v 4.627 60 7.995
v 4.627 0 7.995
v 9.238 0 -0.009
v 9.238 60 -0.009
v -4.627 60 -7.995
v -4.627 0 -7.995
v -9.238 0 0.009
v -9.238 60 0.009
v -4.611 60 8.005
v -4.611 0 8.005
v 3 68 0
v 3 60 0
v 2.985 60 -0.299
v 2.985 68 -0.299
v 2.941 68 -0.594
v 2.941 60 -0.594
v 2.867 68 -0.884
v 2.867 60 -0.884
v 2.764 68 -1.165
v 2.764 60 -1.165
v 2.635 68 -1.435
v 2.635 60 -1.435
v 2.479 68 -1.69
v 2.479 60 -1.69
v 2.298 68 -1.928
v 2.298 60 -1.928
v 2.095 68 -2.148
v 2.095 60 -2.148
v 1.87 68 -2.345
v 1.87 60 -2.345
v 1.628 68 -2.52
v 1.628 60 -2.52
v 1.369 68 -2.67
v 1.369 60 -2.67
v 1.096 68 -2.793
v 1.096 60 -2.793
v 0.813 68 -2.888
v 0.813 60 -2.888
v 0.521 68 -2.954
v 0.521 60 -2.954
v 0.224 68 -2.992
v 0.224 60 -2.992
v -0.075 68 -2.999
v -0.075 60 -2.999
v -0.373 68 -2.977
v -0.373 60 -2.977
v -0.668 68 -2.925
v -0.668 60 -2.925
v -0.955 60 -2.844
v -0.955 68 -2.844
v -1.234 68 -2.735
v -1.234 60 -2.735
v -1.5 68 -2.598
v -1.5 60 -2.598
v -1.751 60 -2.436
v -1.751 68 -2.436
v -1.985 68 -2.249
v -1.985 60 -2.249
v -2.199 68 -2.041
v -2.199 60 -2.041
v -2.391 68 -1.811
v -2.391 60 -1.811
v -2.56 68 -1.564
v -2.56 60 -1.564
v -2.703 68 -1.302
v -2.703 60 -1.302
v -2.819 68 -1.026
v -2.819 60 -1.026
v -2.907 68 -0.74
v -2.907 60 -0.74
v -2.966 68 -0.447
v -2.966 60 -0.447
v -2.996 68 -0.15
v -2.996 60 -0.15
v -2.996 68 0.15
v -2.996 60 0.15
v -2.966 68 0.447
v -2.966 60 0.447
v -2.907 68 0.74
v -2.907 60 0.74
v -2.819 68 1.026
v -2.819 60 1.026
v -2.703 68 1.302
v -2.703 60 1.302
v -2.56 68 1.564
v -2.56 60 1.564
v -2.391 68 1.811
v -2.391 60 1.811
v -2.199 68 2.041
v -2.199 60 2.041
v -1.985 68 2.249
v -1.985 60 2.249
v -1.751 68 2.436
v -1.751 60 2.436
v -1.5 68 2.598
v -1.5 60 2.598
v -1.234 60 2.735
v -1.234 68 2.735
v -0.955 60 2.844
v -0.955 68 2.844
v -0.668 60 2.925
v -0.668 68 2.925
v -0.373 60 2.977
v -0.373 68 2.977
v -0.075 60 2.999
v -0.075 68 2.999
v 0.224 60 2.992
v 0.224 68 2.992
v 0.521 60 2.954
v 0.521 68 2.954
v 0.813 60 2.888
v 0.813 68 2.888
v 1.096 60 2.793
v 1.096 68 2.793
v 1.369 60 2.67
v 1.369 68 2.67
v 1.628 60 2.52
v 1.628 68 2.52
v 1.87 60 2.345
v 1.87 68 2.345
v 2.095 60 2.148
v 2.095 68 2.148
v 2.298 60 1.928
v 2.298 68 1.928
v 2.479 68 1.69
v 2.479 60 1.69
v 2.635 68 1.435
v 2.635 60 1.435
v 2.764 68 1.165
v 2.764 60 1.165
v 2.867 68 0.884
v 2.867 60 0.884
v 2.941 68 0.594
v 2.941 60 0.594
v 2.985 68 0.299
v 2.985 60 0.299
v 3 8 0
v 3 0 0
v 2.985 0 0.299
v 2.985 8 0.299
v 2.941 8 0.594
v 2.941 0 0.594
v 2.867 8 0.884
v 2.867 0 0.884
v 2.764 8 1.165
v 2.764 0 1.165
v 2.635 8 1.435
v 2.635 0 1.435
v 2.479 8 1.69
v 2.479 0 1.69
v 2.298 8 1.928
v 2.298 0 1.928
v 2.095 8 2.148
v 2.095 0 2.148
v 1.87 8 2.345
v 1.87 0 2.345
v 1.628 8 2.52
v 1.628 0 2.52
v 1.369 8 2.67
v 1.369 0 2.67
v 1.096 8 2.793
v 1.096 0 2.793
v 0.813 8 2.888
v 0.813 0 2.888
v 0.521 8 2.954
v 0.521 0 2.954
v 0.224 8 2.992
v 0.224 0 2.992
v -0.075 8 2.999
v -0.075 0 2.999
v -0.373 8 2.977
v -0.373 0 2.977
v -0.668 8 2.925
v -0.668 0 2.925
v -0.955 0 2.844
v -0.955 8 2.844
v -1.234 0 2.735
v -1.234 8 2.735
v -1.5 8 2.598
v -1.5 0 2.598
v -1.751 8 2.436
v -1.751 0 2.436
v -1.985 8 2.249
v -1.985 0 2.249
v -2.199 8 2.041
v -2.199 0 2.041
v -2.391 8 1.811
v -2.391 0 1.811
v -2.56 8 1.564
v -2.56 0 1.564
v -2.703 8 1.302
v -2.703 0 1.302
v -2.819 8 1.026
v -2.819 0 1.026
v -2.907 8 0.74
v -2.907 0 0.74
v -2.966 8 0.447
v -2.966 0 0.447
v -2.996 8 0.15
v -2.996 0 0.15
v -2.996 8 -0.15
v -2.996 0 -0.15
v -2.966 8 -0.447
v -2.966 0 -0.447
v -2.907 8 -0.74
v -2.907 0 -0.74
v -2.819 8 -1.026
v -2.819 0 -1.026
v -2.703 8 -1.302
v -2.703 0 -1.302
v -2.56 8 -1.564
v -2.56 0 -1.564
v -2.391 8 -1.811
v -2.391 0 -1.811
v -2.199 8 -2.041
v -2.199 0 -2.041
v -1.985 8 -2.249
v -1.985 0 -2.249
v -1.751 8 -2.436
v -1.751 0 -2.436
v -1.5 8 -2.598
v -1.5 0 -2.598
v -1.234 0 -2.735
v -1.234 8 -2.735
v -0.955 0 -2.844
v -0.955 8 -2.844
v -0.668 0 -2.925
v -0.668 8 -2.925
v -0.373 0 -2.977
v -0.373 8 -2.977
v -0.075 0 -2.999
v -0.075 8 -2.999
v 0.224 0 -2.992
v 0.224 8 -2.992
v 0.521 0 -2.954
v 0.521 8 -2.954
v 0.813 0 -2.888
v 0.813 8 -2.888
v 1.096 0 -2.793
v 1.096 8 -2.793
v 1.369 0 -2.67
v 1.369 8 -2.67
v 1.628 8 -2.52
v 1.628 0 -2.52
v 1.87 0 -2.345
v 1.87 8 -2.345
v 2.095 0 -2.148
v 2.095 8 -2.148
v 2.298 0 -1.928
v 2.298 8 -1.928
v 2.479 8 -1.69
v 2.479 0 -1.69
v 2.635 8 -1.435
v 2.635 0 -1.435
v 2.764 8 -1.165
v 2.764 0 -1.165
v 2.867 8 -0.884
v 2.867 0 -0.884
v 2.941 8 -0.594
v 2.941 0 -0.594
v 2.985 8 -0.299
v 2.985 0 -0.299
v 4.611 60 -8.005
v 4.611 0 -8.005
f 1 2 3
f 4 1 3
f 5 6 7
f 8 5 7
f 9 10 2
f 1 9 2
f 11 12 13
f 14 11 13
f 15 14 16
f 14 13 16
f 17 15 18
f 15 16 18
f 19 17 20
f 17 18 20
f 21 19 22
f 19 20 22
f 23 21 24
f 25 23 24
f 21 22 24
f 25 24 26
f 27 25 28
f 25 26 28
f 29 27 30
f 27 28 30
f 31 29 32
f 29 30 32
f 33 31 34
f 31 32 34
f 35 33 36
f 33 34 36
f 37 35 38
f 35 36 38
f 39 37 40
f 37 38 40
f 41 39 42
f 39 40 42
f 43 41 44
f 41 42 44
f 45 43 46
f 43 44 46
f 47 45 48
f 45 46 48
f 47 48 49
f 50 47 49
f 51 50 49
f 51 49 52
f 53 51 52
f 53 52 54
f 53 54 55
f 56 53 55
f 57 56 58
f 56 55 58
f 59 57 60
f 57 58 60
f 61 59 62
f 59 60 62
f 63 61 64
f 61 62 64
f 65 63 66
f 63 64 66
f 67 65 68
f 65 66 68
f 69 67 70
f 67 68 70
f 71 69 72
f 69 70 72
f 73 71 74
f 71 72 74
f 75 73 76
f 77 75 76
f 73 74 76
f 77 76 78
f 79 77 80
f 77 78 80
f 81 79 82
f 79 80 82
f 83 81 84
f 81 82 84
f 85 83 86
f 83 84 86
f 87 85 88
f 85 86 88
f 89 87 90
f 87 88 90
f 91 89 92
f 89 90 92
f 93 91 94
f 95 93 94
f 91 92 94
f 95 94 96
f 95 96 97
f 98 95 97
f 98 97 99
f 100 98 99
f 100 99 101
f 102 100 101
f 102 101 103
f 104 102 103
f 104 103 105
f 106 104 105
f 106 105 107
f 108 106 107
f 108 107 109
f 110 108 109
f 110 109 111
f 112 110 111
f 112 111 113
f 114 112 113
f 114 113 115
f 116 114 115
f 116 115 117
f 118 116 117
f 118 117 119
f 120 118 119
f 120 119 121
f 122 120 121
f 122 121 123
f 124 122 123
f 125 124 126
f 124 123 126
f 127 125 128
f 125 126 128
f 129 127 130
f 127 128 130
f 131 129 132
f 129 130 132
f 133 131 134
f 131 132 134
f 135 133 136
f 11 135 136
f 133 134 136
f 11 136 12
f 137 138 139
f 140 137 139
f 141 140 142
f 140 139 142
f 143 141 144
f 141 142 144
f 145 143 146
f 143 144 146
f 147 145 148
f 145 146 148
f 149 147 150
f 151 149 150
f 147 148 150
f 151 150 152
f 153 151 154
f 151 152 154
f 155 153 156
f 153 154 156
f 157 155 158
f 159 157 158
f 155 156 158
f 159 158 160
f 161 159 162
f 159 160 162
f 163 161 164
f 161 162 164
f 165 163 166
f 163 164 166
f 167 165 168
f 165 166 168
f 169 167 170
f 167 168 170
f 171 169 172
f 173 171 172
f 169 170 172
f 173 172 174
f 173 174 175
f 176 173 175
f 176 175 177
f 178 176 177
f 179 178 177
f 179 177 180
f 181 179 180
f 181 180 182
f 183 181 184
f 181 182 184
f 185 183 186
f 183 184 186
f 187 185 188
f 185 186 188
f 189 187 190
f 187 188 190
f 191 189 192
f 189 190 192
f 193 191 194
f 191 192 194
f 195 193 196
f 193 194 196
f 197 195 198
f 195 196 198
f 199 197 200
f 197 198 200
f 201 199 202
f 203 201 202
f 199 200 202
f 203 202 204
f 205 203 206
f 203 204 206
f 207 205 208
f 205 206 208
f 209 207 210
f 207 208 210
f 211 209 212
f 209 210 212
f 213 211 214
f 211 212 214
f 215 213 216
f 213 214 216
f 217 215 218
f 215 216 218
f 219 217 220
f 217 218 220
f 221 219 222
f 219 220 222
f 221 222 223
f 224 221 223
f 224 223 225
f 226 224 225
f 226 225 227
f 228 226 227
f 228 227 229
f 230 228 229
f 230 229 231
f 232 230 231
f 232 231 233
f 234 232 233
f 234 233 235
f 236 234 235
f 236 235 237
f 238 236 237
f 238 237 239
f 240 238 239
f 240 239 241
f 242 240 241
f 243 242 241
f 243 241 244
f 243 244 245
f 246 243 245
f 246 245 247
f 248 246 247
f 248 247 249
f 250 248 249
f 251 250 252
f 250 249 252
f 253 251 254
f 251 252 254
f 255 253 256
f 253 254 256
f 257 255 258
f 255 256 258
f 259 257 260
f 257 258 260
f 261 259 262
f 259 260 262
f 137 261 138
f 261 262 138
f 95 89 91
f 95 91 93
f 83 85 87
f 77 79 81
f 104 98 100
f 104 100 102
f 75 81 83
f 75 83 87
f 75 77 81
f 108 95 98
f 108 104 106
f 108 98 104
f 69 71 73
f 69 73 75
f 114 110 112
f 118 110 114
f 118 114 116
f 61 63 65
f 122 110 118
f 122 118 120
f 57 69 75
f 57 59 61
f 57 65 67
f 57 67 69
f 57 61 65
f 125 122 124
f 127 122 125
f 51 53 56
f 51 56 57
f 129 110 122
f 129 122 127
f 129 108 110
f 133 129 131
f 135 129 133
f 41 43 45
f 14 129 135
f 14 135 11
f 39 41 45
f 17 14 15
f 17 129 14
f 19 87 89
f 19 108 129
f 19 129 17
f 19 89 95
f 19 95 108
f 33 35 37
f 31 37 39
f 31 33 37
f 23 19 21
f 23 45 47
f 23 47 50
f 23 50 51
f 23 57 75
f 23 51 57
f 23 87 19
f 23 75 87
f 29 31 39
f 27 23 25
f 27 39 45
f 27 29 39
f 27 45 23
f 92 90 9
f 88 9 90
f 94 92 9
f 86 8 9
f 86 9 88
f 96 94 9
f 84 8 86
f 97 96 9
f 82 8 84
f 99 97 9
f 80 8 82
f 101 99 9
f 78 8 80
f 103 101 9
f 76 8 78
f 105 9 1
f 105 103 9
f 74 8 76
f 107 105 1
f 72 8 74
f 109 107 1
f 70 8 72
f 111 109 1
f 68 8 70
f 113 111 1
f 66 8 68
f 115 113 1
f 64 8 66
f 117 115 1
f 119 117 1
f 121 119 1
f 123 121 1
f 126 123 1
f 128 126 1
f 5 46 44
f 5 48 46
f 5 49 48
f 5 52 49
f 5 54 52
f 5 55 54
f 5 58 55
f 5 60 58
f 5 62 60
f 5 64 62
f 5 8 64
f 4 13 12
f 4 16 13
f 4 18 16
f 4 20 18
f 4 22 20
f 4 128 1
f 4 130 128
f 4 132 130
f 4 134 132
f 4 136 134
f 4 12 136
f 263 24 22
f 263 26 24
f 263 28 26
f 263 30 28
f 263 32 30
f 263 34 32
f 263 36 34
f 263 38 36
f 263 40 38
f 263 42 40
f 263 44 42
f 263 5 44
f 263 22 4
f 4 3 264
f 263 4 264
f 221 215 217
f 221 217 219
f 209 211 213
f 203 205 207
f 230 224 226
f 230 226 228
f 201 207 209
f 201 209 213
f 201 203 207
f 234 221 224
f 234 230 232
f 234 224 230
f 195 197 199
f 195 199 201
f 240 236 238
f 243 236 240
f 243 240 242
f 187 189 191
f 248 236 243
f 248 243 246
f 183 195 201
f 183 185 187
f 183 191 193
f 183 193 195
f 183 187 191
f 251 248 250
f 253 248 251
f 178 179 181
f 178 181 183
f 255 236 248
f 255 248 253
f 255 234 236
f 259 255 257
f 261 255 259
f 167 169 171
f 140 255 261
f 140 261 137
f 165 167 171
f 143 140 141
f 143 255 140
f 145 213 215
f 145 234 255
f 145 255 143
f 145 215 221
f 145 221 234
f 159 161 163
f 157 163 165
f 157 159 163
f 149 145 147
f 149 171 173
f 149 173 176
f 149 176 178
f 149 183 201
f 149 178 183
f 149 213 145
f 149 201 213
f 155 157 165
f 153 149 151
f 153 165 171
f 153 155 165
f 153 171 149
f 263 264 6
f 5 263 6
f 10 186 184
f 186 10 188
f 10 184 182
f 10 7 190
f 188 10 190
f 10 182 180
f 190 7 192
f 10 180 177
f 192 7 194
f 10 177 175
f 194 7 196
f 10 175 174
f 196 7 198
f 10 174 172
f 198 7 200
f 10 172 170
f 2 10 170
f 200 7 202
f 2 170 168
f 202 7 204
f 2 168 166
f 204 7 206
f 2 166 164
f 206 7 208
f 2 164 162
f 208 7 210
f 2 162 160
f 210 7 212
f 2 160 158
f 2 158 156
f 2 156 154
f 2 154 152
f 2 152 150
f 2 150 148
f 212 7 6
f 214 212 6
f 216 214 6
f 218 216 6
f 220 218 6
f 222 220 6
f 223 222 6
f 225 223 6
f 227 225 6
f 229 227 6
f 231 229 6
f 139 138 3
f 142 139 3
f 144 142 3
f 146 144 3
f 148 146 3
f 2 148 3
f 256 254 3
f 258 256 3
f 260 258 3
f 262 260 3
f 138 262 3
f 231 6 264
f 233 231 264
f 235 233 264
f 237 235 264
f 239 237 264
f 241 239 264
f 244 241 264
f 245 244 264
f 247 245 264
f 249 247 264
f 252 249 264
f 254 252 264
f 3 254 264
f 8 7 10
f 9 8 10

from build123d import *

# Parameters (mm, degrees)
EXTRUDE_1_DEPTH     = 60
SKETCH_2_R          = 3
EXTRUDE_2_DEPTH     = 8
SKETCH_3_R          = 3
CUT_EXTRUDE_1_DEPTH = 8


with BuildPart() as part:
    # 草图1 → 凸台-拉伸1 (new body)
    with BuildSketch(Plane(origin=(0, 0, 0), x_dir=(1, 0, 0), z_dir=(0, 1, 0))):
        Polygon((4.610693432, 8.004676097), (-4.626906133, 7.995315689), (-9.237599565, -0.009360407), (-4.610693432, -8.004676097), (4.626906133, -7.995315689), (9.237599565, 0.009360407), align=None)
    extrude(amount=EXTRUDE_1_DEPTH)

    # 草图2 → 凸台-拉伸2 (add)
    with BuildSketch(Plane(origin=(0, 60, 0), x_dir=(1, 0, 0), z_dir=(0, 1, 0))):
        Circle(SKETCH_2_R)
    extrude(amount=EXTRUDE_2_DEPTH)

    # 草图3 → 切除-拉伸1 (cut)
    with BuildSketch(Plane.XZ):
        Circle(SKETCH_3_R)
    extrude(amount=-CUT_EXTRUDE_1_DEPTH, mode=Mode.SUBTRACT)


solid = part.part
